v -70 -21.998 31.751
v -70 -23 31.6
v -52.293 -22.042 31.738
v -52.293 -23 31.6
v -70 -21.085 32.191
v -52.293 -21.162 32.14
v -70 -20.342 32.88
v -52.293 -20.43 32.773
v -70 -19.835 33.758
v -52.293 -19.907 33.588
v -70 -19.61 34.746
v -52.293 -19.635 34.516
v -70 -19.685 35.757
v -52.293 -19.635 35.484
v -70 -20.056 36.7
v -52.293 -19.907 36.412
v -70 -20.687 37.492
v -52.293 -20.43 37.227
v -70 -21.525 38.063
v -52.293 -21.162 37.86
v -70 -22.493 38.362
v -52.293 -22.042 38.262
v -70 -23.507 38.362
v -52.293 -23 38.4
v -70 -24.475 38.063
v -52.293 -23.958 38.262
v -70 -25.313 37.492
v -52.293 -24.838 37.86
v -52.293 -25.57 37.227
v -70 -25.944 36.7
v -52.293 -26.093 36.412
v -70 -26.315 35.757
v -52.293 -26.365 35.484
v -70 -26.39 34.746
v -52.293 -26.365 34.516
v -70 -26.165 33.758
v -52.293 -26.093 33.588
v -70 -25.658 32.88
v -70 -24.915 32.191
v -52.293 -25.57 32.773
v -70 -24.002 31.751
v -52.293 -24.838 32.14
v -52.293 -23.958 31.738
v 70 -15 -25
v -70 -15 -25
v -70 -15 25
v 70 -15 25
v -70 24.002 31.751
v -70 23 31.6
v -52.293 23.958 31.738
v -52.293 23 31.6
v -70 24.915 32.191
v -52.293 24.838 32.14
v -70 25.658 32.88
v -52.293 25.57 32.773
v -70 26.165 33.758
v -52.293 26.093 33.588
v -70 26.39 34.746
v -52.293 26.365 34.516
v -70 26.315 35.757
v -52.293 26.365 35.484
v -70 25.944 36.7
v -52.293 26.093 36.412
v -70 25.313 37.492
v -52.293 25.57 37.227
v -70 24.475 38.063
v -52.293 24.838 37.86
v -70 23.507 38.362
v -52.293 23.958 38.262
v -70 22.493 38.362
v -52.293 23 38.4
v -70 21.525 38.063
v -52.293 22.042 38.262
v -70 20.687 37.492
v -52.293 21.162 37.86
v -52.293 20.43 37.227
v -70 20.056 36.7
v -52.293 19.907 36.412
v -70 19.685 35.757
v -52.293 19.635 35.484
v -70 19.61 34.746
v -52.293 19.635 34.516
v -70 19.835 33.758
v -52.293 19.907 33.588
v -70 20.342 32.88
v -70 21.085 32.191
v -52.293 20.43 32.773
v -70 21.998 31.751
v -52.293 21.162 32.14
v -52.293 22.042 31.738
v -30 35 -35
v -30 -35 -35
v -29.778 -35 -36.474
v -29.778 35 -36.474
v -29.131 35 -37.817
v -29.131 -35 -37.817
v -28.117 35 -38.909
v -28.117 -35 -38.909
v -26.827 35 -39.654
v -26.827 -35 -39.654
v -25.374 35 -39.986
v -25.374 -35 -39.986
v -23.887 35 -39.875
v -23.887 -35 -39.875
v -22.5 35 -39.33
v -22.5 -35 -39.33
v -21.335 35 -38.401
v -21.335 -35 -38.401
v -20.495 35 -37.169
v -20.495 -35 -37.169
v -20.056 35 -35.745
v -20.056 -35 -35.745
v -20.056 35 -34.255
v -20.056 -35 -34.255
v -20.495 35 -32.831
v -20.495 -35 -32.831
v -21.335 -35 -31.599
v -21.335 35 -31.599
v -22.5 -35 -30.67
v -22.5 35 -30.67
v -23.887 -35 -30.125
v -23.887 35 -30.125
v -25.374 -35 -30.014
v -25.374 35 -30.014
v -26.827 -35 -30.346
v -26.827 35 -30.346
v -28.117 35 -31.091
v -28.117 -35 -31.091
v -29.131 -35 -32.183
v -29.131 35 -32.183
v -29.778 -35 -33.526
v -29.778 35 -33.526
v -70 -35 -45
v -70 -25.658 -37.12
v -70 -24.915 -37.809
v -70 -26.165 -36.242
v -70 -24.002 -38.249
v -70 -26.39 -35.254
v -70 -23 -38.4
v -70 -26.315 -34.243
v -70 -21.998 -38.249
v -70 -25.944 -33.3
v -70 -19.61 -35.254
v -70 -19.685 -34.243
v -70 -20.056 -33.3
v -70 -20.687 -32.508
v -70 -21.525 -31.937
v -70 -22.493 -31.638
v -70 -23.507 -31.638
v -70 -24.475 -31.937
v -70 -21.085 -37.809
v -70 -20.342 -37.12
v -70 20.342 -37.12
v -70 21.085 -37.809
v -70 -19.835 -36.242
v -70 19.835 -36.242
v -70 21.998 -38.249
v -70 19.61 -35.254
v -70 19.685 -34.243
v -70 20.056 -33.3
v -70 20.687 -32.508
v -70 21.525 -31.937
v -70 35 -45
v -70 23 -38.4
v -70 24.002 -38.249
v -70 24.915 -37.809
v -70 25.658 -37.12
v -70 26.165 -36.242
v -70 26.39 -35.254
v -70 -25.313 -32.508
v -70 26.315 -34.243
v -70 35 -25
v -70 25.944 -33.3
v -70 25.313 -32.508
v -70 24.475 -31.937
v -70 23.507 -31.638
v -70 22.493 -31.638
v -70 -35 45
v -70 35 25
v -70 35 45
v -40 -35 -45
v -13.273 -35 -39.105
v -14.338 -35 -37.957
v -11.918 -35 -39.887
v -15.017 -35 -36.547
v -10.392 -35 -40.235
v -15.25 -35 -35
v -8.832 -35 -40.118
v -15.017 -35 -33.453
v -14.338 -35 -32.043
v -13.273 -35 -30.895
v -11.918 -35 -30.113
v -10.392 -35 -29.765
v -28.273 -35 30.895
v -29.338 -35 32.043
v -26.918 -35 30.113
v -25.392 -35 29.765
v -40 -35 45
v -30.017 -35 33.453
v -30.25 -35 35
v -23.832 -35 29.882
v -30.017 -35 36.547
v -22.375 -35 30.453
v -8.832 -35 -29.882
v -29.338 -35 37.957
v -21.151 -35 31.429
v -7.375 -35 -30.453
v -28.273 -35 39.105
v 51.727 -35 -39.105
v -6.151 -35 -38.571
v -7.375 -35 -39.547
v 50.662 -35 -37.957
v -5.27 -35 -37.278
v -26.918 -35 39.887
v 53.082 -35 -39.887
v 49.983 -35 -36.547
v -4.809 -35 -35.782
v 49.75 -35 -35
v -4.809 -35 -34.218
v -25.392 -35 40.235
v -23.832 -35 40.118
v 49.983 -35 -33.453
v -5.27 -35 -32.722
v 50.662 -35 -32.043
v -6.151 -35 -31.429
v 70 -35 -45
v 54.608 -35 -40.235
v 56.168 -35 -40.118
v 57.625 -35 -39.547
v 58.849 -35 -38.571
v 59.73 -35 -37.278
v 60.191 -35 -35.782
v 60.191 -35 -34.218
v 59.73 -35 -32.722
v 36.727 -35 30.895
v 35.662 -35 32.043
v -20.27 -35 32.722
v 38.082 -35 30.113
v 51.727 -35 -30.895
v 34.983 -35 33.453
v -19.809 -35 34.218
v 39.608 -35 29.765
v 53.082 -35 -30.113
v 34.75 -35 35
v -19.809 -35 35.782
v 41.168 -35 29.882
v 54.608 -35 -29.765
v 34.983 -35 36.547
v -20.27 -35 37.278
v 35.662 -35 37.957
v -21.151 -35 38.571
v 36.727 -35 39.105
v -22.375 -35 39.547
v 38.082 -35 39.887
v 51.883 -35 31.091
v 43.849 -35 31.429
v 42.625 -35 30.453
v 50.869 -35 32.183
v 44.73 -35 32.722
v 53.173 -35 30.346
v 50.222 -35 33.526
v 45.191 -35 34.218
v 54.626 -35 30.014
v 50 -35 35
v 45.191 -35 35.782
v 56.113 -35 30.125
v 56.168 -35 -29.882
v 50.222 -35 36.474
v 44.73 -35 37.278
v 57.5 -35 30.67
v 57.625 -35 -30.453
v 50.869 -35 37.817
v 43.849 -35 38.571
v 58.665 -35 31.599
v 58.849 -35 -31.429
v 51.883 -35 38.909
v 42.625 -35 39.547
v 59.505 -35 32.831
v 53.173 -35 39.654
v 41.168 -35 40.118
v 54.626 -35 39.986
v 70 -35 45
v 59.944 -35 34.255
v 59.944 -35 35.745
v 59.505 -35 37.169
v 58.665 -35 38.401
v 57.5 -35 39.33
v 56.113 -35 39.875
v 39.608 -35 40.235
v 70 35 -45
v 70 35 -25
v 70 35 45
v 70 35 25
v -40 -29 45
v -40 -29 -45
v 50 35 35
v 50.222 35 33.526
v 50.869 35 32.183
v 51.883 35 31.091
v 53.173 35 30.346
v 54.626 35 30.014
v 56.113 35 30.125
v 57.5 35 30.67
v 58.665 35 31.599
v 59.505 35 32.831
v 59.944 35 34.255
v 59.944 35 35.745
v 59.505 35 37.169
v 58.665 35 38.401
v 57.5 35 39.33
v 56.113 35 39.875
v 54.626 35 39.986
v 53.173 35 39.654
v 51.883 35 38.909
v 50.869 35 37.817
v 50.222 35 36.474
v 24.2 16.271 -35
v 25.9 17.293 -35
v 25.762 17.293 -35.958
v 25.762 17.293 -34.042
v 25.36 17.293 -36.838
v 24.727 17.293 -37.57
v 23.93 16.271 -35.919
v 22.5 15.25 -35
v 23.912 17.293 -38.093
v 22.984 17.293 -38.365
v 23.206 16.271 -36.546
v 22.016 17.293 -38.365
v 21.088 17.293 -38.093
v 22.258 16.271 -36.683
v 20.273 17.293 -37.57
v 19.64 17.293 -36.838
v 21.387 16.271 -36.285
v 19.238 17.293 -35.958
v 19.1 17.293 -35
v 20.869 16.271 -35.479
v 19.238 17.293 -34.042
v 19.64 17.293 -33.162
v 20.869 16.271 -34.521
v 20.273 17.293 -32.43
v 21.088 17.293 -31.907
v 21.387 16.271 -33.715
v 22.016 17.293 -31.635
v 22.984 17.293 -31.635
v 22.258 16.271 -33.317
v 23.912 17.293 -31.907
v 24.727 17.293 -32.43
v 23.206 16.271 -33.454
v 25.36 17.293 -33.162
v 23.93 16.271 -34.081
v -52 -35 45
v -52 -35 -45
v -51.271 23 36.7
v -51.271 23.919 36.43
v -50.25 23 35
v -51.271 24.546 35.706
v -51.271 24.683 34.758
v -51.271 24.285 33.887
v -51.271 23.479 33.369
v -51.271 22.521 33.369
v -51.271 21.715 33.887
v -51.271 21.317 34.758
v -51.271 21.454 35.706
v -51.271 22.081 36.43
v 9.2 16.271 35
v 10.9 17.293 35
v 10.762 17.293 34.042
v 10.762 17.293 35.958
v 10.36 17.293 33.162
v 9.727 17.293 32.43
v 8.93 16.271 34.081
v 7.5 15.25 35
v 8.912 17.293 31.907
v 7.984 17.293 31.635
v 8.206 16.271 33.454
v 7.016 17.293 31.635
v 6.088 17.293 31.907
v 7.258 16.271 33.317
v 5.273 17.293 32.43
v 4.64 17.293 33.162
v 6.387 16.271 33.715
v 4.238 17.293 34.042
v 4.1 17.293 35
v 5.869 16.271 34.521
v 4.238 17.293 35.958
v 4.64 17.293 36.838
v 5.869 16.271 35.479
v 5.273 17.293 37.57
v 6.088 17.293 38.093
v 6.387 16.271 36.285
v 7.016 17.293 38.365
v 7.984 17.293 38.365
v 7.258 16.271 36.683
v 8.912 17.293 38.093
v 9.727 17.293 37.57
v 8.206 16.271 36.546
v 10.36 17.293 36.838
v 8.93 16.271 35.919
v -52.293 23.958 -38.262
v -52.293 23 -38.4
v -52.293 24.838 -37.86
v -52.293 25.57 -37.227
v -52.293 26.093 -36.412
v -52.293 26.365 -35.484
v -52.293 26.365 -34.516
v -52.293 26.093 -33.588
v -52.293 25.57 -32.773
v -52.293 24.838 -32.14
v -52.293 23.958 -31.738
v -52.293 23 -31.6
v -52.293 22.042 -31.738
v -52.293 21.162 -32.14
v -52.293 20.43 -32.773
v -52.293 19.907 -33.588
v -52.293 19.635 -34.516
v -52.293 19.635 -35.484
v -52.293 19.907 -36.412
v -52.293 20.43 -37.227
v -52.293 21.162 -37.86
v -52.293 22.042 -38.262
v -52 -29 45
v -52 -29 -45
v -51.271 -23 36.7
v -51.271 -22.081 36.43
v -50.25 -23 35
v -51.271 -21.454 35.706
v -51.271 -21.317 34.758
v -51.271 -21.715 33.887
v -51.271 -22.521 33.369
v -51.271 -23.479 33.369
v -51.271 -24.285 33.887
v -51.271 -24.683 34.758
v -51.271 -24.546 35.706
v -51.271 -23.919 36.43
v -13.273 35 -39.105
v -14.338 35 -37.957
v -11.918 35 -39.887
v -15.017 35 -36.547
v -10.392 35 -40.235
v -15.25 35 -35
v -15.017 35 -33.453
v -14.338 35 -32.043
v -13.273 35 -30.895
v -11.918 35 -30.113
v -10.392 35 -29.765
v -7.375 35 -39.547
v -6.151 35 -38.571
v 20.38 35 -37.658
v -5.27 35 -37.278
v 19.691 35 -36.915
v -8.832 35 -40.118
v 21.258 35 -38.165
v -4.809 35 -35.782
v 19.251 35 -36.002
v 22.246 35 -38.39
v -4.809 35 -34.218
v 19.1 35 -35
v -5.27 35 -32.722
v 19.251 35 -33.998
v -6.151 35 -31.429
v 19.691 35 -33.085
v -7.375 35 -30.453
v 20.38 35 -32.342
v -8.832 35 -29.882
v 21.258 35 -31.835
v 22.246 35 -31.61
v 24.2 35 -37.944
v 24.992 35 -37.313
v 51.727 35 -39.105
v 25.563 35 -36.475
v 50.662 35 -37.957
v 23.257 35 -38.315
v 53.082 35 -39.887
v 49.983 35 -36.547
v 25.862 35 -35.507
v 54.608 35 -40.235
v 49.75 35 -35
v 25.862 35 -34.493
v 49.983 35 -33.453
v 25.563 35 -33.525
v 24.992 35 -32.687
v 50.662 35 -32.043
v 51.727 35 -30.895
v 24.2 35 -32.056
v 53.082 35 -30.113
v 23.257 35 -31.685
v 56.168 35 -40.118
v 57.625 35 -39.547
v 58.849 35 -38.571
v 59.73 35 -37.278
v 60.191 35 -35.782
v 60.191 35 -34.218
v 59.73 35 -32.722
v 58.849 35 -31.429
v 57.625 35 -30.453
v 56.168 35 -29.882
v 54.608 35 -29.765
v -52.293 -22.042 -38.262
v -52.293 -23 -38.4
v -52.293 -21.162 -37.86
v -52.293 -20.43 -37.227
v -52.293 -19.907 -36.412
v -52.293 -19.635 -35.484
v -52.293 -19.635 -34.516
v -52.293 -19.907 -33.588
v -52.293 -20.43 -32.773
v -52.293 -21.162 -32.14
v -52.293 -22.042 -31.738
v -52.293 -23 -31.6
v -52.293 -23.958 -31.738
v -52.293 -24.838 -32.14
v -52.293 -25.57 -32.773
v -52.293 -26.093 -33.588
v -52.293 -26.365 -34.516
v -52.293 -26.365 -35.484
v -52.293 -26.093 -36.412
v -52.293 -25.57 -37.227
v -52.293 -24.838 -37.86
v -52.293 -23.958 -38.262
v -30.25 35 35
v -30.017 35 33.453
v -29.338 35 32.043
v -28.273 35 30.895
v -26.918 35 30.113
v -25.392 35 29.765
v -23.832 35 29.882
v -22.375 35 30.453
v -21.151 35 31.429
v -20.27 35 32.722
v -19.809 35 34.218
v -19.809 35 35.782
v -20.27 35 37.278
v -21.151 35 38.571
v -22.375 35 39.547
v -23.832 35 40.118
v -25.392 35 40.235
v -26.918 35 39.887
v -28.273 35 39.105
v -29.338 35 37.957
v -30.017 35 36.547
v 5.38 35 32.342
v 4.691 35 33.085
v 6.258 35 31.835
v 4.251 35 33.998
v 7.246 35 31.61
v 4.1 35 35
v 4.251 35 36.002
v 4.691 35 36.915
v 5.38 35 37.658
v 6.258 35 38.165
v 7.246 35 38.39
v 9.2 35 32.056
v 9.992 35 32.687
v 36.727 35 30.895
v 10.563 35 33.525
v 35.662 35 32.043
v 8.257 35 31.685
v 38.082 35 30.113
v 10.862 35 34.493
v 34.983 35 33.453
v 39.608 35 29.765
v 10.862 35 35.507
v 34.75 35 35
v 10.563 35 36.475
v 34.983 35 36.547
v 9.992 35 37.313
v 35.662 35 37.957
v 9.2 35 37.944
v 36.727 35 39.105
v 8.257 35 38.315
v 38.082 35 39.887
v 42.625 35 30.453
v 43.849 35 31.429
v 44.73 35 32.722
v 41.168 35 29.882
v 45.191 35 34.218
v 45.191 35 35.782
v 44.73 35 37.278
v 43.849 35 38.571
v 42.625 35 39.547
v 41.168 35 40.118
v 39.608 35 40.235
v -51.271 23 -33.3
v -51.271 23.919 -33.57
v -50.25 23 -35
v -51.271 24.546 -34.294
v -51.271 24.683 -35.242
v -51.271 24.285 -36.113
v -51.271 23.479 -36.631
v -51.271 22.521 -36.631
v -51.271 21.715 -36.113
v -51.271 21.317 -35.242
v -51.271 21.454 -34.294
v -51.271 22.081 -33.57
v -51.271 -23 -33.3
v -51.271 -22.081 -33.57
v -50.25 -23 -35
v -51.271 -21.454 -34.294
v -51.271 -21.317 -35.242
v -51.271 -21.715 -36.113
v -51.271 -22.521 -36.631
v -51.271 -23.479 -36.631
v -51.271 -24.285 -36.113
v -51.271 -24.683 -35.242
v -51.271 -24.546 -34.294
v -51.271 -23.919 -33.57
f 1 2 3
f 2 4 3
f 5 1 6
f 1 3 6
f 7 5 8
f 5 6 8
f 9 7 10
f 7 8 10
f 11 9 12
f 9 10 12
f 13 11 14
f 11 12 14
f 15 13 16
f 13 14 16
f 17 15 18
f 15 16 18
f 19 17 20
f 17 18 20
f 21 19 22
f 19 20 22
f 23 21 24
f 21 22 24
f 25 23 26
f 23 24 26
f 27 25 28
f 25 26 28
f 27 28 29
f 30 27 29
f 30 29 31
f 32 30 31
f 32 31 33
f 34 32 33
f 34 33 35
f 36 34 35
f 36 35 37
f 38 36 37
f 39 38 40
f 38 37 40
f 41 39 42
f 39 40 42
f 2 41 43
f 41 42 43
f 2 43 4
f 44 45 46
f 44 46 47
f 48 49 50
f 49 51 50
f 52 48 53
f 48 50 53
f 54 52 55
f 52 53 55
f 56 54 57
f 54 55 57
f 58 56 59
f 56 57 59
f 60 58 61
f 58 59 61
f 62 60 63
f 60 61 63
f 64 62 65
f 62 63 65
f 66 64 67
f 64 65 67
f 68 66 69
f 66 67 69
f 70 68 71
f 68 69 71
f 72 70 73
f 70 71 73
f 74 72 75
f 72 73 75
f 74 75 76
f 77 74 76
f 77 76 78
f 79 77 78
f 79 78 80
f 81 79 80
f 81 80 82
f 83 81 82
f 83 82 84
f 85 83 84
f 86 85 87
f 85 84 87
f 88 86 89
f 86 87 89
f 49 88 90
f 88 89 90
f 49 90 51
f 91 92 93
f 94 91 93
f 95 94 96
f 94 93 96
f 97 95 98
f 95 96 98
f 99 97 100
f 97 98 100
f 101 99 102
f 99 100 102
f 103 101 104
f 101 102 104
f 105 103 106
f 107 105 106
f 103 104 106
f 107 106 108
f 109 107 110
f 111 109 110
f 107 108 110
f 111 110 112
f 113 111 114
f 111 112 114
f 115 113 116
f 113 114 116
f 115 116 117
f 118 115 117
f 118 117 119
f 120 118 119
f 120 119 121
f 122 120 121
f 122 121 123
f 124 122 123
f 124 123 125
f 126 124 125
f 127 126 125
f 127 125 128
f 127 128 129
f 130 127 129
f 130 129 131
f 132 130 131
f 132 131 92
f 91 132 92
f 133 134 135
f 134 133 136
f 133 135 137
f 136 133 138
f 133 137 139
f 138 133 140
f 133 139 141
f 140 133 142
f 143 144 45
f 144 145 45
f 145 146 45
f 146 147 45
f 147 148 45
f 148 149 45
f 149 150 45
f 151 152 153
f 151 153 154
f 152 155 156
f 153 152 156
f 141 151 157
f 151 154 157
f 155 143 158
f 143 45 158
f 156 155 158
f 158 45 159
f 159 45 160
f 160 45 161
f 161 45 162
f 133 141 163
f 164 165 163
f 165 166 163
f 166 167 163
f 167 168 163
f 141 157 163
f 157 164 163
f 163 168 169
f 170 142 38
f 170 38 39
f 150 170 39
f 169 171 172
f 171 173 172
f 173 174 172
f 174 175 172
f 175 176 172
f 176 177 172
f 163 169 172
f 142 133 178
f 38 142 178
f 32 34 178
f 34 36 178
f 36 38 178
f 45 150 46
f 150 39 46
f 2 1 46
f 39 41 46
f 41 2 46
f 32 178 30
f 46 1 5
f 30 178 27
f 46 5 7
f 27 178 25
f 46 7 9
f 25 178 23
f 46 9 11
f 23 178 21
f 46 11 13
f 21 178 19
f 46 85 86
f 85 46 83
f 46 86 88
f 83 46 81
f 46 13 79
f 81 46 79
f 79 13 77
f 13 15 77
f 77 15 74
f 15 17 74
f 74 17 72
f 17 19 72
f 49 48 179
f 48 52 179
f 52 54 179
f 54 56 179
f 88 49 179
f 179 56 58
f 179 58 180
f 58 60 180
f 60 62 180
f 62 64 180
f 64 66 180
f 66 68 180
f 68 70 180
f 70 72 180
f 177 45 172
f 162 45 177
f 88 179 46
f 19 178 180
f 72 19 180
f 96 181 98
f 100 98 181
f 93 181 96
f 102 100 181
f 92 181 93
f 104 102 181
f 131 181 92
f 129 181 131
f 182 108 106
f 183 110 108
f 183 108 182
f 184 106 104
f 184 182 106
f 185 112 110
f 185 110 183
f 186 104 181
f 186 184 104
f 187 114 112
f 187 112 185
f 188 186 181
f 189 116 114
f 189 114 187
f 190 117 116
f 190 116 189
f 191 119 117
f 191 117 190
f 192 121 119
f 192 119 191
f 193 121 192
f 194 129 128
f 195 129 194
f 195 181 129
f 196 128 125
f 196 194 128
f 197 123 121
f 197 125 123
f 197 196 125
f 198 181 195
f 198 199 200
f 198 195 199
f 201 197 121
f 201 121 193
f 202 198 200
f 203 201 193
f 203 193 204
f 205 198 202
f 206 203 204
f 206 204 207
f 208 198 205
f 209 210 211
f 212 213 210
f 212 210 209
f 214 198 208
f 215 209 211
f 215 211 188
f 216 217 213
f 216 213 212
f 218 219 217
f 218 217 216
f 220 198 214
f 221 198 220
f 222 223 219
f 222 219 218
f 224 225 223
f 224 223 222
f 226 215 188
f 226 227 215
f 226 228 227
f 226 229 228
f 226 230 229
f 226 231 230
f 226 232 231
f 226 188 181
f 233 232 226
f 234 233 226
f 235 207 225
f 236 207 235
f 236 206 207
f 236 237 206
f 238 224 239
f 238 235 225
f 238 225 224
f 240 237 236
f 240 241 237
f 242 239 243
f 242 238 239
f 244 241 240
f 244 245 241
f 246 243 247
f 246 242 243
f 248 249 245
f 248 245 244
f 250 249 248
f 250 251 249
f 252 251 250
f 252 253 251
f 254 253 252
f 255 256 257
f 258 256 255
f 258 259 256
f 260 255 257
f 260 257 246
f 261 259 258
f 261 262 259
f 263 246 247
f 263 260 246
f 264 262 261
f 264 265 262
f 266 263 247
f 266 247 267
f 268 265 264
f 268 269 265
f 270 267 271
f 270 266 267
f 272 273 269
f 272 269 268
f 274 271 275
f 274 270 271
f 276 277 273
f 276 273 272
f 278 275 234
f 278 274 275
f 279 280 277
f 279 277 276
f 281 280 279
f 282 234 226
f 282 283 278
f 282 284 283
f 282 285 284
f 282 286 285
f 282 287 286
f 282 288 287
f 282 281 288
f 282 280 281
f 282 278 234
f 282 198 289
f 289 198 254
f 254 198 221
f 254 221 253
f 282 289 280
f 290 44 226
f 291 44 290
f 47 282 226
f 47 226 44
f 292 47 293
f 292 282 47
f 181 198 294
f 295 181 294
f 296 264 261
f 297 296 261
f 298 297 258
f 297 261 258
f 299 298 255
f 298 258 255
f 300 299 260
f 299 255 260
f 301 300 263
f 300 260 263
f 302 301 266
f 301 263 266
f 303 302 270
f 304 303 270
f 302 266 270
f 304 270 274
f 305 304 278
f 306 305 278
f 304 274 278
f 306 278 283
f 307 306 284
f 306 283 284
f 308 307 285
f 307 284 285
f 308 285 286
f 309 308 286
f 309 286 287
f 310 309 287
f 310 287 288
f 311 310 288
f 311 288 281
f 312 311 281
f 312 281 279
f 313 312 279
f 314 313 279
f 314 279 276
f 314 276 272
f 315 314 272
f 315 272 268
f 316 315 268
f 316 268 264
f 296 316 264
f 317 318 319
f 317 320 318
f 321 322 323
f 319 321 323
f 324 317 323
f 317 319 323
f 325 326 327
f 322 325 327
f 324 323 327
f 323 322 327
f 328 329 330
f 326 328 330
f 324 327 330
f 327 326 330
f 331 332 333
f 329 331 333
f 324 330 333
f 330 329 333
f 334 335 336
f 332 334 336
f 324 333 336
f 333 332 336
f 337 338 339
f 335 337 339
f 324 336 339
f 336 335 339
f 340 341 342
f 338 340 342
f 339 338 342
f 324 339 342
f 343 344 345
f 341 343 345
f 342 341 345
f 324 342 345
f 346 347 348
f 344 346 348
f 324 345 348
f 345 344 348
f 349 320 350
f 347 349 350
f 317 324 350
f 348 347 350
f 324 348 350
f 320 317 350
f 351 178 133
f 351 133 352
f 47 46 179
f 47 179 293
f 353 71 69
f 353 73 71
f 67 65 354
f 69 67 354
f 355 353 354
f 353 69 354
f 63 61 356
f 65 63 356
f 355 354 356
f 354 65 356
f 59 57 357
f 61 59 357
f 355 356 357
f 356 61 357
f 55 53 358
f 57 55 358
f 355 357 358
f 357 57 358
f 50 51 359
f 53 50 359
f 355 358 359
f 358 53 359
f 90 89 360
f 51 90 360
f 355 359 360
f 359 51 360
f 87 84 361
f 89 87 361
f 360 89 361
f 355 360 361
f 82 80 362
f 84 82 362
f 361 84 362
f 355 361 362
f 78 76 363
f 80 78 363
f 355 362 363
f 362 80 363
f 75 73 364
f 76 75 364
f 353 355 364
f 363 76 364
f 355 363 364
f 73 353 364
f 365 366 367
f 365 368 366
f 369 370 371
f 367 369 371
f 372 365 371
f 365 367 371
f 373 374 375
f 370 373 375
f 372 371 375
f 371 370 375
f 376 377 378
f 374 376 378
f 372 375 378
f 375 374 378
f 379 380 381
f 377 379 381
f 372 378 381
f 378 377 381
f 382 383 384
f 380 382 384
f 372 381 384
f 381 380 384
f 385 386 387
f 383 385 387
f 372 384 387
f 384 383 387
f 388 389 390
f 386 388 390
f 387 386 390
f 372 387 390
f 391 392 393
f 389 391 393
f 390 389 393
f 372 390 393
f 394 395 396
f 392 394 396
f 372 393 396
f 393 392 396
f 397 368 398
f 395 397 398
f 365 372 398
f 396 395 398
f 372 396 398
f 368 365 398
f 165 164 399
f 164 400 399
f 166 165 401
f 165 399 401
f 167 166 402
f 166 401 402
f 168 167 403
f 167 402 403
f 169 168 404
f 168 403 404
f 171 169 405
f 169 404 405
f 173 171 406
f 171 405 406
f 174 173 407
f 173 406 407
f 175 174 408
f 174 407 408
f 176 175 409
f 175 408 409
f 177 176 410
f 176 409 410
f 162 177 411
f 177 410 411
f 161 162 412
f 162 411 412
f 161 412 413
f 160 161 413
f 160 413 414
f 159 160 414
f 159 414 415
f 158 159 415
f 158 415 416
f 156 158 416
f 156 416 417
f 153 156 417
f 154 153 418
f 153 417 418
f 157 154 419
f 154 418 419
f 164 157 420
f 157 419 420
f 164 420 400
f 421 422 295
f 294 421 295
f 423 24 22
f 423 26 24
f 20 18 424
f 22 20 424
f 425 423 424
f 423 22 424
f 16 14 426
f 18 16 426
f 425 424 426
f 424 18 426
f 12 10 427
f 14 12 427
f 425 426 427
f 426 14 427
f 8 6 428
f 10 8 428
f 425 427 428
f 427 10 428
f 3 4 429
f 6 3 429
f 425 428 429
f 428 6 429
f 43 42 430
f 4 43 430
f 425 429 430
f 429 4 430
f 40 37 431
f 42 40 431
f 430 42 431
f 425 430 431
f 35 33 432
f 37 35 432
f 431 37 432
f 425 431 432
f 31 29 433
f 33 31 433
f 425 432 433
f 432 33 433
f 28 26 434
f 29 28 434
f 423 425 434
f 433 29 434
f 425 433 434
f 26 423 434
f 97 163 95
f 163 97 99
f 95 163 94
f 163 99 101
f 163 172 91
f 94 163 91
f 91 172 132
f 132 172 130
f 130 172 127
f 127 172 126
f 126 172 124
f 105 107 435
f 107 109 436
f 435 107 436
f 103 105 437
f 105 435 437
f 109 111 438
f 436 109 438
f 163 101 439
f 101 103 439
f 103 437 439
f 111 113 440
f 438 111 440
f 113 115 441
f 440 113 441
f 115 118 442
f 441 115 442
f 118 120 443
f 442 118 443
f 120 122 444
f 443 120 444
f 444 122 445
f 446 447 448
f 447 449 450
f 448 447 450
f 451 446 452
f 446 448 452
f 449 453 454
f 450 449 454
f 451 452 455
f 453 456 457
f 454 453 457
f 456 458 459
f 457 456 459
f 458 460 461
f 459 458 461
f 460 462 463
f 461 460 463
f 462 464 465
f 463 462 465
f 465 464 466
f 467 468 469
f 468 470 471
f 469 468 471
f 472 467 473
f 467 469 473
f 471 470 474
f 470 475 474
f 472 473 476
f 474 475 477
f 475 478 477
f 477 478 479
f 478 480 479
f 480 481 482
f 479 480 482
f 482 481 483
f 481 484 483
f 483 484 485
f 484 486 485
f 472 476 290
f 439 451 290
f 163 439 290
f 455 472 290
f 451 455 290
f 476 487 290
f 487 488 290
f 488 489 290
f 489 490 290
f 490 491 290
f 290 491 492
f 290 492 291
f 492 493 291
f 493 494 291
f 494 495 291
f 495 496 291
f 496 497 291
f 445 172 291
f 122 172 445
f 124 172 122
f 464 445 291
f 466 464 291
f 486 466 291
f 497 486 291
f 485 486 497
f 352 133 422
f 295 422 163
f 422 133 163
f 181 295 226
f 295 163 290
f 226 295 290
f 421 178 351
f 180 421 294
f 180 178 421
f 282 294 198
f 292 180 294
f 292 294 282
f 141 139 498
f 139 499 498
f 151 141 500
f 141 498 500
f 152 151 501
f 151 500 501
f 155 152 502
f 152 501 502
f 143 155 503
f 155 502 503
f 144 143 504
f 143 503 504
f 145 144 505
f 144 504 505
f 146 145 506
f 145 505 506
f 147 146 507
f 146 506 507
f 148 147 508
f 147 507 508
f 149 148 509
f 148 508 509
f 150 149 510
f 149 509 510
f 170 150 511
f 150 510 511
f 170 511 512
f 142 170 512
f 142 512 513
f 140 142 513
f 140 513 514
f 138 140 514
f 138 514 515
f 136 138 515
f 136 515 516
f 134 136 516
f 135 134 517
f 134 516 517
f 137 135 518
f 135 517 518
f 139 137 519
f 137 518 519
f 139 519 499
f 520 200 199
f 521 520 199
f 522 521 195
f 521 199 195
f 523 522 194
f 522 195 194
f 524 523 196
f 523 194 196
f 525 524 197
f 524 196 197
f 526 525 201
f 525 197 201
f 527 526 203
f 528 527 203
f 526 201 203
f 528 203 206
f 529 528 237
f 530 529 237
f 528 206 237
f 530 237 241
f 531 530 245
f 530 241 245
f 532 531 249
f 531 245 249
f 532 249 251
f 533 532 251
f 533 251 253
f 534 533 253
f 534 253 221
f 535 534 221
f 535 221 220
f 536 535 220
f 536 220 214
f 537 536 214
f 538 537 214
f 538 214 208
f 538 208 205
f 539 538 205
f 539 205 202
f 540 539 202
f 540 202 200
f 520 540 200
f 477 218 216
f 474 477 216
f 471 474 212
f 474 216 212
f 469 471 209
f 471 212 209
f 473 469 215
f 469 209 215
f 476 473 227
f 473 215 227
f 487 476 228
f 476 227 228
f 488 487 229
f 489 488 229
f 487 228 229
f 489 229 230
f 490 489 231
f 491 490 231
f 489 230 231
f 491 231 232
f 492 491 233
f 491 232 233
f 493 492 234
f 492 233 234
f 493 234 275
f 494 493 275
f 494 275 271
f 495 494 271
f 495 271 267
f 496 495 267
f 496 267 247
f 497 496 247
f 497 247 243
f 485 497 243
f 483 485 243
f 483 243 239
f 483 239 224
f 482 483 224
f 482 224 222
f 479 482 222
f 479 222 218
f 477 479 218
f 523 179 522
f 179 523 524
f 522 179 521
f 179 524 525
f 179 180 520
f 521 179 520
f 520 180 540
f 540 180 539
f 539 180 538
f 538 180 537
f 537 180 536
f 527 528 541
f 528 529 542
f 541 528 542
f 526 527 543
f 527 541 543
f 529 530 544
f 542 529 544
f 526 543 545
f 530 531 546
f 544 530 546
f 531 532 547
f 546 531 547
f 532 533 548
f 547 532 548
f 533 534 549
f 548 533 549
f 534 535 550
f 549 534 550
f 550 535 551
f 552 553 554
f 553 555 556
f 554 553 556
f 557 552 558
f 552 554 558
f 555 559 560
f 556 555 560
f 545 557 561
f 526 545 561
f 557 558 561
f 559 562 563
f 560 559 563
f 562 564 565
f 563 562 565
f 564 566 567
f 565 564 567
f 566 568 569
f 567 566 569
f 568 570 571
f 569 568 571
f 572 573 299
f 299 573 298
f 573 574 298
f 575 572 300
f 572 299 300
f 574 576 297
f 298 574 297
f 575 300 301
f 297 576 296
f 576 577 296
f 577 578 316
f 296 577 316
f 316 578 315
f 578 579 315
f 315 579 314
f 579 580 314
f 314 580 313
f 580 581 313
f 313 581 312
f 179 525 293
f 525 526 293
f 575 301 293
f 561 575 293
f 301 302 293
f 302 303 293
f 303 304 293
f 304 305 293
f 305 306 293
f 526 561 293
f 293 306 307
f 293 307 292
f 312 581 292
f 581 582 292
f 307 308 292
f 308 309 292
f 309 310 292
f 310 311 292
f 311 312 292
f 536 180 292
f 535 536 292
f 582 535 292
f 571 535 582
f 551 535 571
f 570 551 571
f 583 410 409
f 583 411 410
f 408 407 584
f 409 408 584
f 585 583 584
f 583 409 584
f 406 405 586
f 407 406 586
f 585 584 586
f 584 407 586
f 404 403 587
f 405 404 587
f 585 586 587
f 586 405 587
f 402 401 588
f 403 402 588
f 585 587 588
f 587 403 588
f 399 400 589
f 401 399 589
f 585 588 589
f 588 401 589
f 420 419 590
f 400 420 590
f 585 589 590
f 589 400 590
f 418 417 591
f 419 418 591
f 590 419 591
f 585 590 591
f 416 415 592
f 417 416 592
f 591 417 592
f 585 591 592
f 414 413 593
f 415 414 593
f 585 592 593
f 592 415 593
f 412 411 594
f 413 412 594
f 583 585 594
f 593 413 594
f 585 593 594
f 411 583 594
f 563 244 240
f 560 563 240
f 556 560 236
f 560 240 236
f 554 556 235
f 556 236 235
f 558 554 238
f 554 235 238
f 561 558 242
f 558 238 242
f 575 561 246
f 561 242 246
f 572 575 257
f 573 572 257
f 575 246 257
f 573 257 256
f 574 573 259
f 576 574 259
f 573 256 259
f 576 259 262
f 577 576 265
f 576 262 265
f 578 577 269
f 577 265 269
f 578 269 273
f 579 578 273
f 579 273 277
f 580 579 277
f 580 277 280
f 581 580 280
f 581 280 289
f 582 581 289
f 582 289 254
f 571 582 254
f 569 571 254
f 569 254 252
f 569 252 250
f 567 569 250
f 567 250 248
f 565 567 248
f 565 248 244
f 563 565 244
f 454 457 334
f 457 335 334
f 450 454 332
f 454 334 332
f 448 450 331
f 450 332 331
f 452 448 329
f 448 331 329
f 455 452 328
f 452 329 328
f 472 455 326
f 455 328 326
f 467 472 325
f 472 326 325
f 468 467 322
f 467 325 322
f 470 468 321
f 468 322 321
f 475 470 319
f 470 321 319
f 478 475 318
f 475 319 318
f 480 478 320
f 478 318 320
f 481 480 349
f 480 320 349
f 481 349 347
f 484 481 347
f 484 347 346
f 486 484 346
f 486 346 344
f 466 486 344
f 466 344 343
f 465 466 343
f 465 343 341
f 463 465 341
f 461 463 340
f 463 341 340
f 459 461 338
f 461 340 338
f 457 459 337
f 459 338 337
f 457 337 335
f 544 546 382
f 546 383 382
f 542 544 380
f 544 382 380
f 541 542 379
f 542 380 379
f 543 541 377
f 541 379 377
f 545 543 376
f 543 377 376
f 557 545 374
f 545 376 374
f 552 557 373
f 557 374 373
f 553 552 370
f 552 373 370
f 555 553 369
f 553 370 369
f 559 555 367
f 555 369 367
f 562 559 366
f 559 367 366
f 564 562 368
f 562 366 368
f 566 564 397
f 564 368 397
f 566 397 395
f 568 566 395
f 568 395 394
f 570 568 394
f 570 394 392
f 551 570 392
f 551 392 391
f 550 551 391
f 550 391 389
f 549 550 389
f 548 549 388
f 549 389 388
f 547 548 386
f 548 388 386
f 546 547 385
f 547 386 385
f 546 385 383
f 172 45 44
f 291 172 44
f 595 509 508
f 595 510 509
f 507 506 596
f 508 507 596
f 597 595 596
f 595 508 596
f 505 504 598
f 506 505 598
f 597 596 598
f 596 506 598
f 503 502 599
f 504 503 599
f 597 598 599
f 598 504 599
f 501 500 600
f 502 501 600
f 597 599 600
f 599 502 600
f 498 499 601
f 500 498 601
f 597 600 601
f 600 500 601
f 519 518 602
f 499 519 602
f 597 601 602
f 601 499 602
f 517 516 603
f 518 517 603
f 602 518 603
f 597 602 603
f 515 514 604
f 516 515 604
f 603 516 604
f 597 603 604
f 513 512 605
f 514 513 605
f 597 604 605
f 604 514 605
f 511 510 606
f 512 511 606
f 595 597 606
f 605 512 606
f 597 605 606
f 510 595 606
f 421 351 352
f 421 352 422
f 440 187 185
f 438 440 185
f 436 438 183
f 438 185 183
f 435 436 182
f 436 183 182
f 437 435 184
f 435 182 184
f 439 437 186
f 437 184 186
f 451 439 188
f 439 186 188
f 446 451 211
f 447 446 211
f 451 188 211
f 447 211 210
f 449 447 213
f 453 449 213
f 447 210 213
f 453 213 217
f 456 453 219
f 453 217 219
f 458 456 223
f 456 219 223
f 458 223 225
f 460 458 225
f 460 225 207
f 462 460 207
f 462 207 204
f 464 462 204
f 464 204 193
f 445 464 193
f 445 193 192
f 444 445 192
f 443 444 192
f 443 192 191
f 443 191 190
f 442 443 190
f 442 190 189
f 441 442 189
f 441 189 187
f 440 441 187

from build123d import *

# Parameters (mm, degrees)
SKETCH1_W               = 140
SKETCH1_H               = 70
BOSS_EXTRUDE1_DEPTH     = 45
CUT_EXTRUDE1_DEPTH      = 109.742815855
CUT_EXTRUDE1_DEPTH_BACK = 50
SKETCH2_W               = 140
SKETCH2_H               = 50
M10_CLEARANCE_HOLE1_D   = 10.5
CUT_EXTRUDE2_DEPTH      = 91.277350426
CUT_EXTRUDE2_DEPTH_BACK = 91.277350426
SKETCH9_W               = 12
SKETCH9_H               = 6
F_10_0MM_DOWEL_HOLE1_D  = 10
M8_TAPPED_HOLE1_D       = 6.8
M8_TAPPED_HOLE1_DEPTH   = 17.707073895
M8_TAPPED_HOLE1_TIP     = 2.042926105
M8_TAPPED_HOLE2_D       = 6.8
M8_TAPPED_HOLE2_DEPTH   = 17.707073895
M8_TAPPED_HOLE2_TIP     = 2.042926105


with BuildPart() as part:
    # Sketch1 → Boss-Extrude1 (new, symmetric)
    with BuildSketch(Plane.XY):
        Rectangle(SKETCH1_W, SKETCH1_H)
    extrude(amount=BOSS_EXTRUDE1_DEPTH, both=True)

    # Sketch2 → Cut-Extrude1 (cut, two sides: drawn at the far end of the back side and taken through both)
    with BuildSketch(Plane(origin=(0, 35, 0), x_dir=(1, 0, 0), z_dir=(0, 1, 0)).offset(-CUT_EXTRUDE1_DEPTH_BACK)):
        Rectangle(SKETCH2_W, SKETCH2_H)
    extrude(amount=CUT_EXTRUDE1_DEPTH + CUT_EXTRUDE1_DEPTH_BACK, mode=Mode.SUBTRACT)

    # M10 Clearance Hole1 (through all)
    with Locations(Plane(origin=(0, 35, 0), x_dir=(1, 0, 0), z_dir=(0, 1, 0))):
        with Locations((55, 35), (40, -35), (-25, -35), (-10, 35)):
            Hole(M10_CLEARANCE_HOLE1_D / 2)

    # Sketch9 → Cut-Extrude2 (cut, two sides: drawn at the far end of the back side and taken through both)
    with BuildSketch(Plane.XY.offset(-CUT_EXTRUDE2_DEPTH_BACK)):
        with Locations((-46, -32)):
            Rectangle(SKETCH9_W, SKETCH9_H)
    extrude(amount=CUT_EXTRUDE2_DEPTH + CUT_EXTRUDE2_DEPTH_BACK, mode=Mode.SUBTRACT)

    # Ø10.0mm Dowel Hole1 (through all)
    with Locations(Plane(origin=(0, 35, 0), x_dir=(1, 0, 0), z_dir=(0, 1, 0))):
        with Locations((55, -35), (-25, 35)):
            Hole(F_10_0MM_DOWEL_HOLE1_D / 2)

    # M8 Tapped Hole1
    with Locations(Plane(origin=(0, 35, 0), x_dir=(1, 0, 0), z_dir=(0, 1, 0))):
        with Locations((22.5, 35), (7.5, -35)):
            Hole(M8_TAPPED_HOLE1_D / 2, depth=M8_TAPPED_HOLE1_DEPTH)
            with Locations((0, 0, -(M8_TAPPED_HOLE1_DEPTH + M8_TAPPED_HOLE1_TIP / 2))):  # 118° drill point
                Cone(0, M8_TAPPED_HOLE1_D / 2, M8_TAPPED_HOLE1_TIP, mode=Mode.SUBTRACT)

    # M8 Tapped Hole2
    with Locations(Plane.ZY.offset(70)):
        with Locations((-35, 23), (-35, -23), (35, 23), (35, -23)):
            Hole(M8_TAPPED_HOLE2_D / 2, depth=M8_TAPPED_HOLE2_DEPTH)
            with Locations((0, 0, -(M8_TAPPED_HOLE2_DEPTH + M8_TAPPED_HOLE2_TIP / 2))):  # 118° drill point
                Cone(0, M8_TAPPED_HOLE2_D / 2, M8_TAPPED_HOLE2_TIP, mode=Mode.SUBTRACT)


solid = part.part
